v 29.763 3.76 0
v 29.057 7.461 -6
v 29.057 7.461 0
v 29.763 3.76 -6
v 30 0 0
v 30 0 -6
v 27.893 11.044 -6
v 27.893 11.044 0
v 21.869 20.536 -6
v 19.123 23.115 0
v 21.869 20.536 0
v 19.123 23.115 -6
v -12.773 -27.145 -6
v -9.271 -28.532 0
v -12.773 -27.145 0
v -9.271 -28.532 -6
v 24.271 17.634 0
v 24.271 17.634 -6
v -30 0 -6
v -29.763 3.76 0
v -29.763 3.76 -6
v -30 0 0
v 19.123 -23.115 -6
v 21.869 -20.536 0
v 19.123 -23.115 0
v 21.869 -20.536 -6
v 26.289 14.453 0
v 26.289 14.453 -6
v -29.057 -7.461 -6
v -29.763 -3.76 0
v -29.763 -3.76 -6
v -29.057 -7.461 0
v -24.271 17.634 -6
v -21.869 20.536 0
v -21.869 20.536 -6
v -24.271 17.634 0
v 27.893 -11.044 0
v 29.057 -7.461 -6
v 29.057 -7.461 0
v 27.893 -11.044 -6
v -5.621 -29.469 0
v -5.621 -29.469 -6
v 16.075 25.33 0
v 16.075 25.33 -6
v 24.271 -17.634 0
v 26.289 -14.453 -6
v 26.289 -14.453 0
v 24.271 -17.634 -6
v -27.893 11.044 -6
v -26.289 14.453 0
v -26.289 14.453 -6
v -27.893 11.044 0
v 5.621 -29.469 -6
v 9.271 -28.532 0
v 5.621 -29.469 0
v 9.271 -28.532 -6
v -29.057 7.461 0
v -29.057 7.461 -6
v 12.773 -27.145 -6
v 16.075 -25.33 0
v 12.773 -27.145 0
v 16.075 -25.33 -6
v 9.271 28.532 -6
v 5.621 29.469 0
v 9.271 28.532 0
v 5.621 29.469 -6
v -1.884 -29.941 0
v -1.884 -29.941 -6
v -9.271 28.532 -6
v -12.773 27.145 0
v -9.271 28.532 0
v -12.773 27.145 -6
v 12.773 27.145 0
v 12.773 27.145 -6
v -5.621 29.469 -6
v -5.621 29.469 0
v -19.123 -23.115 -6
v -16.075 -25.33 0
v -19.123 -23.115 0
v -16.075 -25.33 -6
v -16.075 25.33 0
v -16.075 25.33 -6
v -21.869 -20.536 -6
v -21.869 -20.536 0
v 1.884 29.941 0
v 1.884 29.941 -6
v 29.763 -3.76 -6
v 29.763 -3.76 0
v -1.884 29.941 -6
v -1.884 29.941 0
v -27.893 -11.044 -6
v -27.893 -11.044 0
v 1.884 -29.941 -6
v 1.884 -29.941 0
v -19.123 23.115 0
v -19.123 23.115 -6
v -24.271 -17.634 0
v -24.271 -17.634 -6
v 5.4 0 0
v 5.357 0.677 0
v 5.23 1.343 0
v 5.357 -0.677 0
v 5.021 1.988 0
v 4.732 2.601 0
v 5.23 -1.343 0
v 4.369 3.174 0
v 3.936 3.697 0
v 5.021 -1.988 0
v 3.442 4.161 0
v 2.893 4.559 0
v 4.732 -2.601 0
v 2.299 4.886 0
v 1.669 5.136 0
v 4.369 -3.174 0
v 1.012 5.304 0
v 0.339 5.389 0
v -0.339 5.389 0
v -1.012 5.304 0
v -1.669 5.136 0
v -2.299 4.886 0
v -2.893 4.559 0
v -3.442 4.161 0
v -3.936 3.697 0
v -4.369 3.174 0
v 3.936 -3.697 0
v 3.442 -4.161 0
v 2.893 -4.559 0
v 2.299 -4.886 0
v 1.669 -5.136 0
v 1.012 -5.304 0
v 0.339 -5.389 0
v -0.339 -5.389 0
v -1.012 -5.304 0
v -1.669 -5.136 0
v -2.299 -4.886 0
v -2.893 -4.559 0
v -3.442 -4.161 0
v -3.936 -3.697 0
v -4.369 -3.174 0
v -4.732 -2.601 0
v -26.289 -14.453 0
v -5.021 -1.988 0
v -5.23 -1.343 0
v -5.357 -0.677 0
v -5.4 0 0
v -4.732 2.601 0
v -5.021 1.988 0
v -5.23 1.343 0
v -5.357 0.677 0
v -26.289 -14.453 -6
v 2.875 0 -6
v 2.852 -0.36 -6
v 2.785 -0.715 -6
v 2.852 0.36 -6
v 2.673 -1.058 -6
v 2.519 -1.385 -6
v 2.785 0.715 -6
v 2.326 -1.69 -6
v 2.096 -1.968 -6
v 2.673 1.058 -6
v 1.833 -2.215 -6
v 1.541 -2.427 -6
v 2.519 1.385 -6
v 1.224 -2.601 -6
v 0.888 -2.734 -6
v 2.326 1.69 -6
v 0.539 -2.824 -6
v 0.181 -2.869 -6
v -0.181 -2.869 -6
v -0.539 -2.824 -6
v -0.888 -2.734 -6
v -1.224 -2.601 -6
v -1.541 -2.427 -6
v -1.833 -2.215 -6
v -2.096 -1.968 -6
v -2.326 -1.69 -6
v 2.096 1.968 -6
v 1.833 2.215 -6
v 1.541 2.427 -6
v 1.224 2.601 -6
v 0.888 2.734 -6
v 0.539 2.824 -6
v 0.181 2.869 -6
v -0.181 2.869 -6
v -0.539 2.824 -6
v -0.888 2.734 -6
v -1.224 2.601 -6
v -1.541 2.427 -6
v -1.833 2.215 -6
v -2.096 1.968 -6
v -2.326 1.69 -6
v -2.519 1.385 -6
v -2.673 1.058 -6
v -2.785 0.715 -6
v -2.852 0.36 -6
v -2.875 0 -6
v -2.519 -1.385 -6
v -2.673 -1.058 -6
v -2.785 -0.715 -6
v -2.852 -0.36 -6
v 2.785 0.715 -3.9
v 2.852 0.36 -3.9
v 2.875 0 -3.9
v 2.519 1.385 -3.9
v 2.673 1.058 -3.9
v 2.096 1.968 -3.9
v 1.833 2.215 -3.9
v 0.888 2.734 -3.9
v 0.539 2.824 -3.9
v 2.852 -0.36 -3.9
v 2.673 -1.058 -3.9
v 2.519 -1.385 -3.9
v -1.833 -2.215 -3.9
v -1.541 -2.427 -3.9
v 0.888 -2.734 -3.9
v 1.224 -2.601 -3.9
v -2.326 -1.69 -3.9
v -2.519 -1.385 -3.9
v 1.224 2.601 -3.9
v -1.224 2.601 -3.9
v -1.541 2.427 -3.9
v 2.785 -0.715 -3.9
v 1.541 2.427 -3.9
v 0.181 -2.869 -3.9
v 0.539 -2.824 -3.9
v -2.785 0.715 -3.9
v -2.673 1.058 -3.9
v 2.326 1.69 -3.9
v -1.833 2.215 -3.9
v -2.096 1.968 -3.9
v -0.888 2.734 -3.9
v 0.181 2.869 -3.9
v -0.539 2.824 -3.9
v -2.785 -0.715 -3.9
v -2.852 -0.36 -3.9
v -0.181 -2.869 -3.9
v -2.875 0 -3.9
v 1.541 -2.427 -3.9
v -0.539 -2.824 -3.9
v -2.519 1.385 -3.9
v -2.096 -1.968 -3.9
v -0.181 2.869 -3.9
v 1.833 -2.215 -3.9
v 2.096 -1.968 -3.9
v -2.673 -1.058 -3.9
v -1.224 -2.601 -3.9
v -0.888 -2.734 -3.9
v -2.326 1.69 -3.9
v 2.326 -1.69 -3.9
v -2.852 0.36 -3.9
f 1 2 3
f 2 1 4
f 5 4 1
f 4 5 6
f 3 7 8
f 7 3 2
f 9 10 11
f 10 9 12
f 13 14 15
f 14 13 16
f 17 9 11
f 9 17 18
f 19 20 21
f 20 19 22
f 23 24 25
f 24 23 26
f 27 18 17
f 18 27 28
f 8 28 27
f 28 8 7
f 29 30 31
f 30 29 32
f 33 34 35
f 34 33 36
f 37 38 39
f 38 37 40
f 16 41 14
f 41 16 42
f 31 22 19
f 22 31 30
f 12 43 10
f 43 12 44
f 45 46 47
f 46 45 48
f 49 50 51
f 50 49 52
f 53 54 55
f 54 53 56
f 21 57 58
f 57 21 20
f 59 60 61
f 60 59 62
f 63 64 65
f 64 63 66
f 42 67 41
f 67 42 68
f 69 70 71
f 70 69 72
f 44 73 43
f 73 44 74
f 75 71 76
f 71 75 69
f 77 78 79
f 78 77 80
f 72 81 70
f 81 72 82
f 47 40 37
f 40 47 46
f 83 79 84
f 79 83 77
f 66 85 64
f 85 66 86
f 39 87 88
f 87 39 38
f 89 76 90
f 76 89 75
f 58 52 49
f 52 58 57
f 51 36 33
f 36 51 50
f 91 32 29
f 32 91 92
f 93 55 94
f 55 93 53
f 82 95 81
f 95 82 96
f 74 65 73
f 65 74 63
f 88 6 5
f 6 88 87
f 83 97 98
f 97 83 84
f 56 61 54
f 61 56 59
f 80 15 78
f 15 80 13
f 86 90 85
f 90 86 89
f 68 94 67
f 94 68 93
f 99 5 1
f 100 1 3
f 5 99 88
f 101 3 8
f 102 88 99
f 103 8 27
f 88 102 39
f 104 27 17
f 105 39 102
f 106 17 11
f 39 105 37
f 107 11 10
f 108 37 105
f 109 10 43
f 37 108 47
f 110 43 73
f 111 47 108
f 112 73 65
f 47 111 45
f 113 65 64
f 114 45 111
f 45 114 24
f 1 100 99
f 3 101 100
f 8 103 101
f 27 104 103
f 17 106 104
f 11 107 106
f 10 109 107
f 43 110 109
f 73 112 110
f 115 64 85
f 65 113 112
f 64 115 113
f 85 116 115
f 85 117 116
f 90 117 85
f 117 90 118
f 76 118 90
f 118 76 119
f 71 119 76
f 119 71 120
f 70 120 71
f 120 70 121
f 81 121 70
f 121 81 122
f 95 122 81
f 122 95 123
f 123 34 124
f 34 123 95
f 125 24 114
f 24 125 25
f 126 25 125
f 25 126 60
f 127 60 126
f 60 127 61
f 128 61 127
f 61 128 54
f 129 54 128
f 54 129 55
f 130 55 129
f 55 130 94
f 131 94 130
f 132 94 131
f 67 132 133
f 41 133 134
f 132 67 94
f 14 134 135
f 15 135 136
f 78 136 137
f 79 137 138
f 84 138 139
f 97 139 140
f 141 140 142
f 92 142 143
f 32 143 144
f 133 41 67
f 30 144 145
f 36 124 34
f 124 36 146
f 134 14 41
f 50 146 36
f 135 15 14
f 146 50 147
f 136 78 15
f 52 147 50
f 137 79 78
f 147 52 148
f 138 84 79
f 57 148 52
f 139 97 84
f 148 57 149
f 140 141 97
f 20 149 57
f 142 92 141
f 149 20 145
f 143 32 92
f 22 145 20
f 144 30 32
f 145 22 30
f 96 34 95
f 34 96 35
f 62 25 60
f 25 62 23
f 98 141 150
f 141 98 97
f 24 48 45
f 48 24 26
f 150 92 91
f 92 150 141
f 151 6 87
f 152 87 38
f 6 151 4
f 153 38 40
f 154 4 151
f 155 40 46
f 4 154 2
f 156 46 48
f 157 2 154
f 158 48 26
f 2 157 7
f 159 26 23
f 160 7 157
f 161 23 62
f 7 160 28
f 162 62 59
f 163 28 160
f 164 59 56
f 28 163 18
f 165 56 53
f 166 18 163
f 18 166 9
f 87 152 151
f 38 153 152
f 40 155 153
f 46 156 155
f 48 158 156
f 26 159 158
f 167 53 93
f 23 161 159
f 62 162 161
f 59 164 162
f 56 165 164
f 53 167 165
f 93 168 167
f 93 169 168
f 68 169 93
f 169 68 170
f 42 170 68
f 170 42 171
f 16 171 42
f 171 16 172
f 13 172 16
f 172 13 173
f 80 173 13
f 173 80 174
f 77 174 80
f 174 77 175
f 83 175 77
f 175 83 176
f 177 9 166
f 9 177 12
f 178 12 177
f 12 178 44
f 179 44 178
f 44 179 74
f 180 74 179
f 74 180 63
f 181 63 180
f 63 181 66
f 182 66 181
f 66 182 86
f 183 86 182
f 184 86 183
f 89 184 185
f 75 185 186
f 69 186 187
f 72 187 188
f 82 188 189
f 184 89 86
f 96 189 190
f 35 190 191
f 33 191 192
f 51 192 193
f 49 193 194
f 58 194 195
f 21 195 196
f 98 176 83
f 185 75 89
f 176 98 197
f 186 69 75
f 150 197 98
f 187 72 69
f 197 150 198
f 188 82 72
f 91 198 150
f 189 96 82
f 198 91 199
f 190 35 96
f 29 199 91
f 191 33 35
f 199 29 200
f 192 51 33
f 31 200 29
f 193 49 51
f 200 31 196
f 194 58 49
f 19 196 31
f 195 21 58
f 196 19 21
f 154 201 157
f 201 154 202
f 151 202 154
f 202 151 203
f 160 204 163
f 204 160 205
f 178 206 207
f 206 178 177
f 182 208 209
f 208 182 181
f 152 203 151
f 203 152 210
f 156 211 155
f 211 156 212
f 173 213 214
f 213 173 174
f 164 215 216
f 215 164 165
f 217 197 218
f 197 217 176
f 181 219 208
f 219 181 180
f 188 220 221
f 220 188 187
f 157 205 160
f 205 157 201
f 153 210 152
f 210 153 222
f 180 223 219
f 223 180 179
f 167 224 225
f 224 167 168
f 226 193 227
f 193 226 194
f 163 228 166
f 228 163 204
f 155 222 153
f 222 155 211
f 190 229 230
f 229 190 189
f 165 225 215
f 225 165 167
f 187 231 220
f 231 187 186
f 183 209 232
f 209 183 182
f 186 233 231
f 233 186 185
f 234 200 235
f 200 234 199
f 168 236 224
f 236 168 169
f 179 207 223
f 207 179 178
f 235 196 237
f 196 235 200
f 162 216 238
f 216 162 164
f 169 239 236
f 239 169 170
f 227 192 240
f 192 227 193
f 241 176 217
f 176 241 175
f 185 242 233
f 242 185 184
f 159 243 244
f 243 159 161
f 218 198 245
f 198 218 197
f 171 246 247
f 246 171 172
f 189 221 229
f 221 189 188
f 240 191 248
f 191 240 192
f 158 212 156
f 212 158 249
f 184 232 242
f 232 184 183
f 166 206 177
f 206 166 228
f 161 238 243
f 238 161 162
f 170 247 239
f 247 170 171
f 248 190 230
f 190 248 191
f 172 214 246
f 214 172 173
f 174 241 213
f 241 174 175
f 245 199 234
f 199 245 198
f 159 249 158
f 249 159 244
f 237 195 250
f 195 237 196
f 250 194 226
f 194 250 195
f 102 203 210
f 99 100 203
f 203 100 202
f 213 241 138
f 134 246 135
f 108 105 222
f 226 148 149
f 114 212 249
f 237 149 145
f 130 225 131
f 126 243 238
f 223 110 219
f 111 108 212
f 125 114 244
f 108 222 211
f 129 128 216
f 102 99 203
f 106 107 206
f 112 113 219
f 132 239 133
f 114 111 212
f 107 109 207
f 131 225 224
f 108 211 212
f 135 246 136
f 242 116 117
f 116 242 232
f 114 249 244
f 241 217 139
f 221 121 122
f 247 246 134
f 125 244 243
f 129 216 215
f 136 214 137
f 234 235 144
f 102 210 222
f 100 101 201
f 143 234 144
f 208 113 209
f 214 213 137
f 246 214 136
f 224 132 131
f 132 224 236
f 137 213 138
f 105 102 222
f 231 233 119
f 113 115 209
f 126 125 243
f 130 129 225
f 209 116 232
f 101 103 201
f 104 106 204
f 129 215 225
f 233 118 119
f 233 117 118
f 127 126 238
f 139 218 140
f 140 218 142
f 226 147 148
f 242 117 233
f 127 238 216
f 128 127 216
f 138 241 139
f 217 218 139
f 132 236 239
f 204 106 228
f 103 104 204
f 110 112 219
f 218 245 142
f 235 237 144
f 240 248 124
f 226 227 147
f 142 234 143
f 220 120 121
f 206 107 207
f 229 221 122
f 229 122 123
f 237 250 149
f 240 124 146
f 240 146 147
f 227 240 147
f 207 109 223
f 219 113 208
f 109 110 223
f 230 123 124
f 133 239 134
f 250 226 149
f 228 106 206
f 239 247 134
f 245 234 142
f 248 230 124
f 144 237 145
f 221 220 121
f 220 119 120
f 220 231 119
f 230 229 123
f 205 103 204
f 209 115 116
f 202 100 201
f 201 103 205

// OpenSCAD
$fn = 50;


difference() {
	union() {
		translate(v = [0, 0, -6.0000000000]) {
			cylinder(h = 6, r = 30.0000000000);
		}
		#translate(v = [0, 0, -9.0000000000]) {
			cylinder(h = 9, r = 2.8750000000);
		}
	}
	union() {
		translate(v = [0, 0, 0]) {
			rotate(a = [0, 0, 0]) {
				difference() {
					union() {
						translate(v = [0, 0, -9.0000000000]) {
							cylinder(h = 9, r = 2.6000000000);
						}
						translate(v = [0, 0, -3.9000000000]) {
							cylinder(h = 3.9000000000, r1 = 2.8750000000, r2 = 5.4000000000);
						}
						translate(v = [0, 0, -9.0000000000]) {
							cylinder(h = 9, r = 2.8750000000);
						}
						translate(v = [0, 0, -9.0000000000]) {
							cylinder(h = 9, r = 2.6000000000);
						}
					}
					union();
				}
			}
		}
	}
}
